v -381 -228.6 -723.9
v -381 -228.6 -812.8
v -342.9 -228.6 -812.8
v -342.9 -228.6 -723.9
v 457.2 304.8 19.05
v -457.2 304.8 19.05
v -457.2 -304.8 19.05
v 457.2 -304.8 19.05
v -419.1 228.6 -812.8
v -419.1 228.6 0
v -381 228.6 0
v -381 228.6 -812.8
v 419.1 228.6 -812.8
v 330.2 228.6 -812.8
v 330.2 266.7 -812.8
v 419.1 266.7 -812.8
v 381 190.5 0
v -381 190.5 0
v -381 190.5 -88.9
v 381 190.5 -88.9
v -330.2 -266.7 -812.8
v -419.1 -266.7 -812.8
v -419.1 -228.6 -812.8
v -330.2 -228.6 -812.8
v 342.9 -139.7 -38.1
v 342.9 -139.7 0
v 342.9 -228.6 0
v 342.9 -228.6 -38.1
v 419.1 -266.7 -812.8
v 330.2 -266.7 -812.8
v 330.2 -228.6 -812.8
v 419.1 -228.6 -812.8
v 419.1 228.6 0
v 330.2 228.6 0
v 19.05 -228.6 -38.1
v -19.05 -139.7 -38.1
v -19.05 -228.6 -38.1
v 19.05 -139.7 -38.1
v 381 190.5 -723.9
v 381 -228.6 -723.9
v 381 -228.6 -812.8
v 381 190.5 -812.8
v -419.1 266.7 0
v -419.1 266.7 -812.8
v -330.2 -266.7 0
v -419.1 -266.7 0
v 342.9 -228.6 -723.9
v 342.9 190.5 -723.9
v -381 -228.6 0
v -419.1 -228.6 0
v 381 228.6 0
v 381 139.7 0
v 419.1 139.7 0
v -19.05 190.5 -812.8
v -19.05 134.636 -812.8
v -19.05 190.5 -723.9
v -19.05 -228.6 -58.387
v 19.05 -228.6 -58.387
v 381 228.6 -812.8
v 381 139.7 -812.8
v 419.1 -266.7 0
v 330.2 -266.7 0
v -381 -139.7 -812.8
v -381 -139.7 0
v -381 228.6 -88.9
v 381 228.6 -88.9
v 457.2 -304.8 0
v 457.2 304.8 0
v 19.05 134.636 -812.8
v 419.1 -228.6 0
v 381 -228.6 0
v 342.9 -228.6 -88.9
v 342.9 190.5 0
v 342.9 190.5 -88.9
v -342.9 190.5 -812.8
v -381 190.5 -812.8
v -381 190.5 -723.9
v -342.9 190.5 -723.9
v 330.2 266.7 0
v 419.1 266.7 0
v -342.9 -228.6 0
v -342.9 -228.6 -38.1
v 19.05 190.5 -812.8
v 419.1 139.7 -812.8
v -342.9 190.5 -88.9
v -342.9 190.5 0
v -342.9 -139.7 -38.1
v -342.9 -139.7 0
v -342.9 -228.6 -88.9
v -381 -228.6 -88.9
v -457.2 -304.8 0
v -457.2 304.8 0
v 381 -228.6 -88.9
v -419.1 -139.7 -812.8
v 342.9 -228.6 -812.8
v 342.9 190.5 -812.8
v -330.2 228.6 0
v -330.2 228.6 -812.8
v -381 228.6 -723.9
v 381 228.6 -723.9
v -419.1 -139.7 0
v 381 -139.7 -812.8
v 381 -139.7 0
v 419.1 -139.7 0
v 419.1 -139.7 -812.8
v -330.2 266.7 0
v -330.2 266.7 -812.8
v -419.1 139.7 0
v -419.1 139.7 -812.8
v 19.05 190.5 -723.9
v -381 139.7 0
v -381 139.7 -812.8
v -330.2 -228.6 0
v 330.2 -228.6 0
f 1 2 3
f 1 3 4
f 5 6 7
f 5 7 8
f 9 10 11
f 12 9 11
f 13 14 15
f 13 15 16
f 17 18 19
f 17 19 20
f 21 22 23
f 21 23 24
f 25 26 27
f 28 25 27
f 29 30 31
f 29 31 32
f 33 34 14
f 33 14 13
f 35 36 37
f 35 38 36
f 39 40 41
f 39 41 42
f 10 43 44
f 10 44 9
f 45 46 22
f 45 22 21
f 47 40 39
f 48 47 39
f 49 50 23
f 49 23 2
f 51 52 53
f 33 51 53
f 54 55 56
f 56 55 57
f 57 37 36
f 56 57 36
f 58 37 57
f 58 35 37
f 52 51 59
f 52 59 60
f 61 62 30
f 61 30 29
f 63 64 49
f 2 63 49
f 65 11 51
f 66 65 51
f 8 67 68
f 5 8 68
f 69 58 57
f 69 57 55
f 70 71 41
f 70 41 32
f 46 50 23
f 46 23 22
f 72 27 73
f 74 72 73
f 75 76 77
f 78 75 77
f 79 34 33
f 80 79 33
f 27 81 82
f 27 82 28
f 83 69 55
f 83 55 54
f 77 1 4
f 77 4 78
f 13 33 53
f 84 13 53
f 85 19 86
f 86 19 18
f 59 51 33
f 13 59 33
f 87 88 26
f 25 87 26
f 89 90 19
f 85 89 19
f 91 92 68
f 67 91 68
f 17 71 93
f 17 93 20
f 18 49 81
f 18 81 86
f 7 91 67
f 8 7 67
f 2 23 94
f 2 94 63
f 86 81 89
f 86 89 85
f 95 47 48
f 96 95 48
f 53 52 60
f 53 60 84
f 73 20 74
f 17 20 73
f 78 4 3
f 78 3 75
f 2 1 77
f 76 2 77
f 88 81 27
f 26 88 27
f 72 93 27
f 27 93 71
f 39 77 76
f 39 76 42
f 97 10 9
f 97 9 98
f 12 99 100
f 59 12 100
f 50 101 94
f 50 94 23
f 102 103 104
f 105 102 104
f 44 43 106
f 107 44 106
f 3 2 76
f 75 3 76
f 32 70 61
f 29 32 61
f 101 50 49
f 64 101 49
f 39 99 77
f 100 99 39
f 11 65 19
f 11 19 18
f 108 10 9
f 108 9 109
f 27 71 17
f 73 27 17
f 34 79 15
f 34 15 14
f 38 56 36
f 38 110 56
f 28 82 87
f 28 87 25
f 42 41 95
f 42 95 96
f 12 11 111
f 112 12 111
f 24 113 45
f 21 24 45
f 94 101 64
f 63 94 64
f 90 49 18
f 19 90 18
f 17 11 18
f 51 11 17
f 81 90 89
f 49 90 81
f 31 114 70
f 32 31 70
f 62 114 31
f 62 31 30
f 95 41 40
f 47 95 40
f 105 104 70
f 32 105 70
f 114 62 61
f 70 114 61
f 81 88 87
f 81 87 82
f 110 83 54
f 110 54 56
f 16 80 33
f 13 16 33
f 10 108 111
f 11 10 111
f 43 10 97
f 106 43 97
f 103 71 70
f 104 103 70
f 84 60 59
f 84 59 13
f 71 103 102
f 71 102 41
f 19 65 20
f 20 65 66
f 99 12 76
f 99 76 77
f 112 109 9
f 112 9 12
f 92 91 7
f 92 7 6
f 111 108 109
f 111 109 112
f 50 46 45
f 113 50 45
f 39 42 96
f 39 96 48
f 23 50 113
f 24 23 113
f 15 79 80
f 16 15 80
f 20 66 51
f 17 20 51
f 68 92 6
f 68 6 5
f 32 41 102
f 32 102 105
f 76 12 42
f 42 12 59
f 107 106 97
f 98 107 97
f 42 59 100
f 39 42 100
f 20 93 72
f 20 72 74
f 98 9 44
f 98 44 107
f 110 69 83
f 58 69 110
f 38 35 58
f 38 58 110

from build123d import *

# Parameters (mm, degrees)
F0_W      = 914.4
F0_H      = 609.6
F1_DEPTH  = 19.05
F2_W      = 88.9
F2_H      = 38.1
F3_DEPTH  = 812.8
F4_W      = 38.1
F4_H      = 88.9
F5_DEPTH  = 812.8
F6_W      = 762
F6_H      = 88.9
F7_DEPTH  = 38.1
F8_W      = 419.1
F8_H      = 88.9
F9_DEPTH  = 38.1
F11_W     = 685.8
F11_H     = 88.9
F12_DEPTH = 38.1
F14_DEPTH = 19.05


with BuildPart() as f1:
    # F0 (on Top) → F1 (new body)
    with BuildSketch(Plane.XY):
        Rectangle(F0_W, F0_H)
    extrude(amount=F1_DEPTH)


with BuildPart() as f3:
    # F2 (on face) → F3 (new body)
    with BuildSketch(Plane(origin=(0, 0, 0), x_dir=(1, 0, 0), z_dir=(0, 0, -1))):
        with Locations((-374.65, 247.65)):
            Rectangle(F2_W, F2_H)
        with Locations((-374.65, -247.65)):
            Rectangle(F2_W, F2_H)
        with Locations((374.65, 247.65)):
            Rectangle(F2_W, F2_H)
        with Locations((374.65, -247.65)):
            Rectangle(F2_W, F2_H)
    extrude(amount=F3_DEPTH)


with BuildPart() as f5:
    # F4 (on face) → F5 (new body, through all)
    with BuildSketch(Plane(origin=(0, 0, 0), x_dir=(1, 0, 0), z_dir=(0, 0, -1))):
        with Locations((-400.05, 184.15)):
            Rectangle(F4_W, F4_H)
        with Locations((-400.05, -184.15)):
            Rectangle(F4_W, F4_H)
        with Locations((400.05, 184.15)):
            Rectangle(F4_W, F4_H)
        with Locations((400.05, -184.15)):
            Rectangle(F4_W, F4_H)
    extrude(amount=F5_DEPTH)


with BuildPart() as f7:
    # F6 (on face) → F7 (new body)
    with BuildSketch(Plane.XZ.offset(-228.6)):
        with Locations((0, -44.45)):
            Rectangle(F6_W, F6_H)
        with Locations((0, -768.35)):
            Rectangle(F6_W, F6_H)
    extrude(amount=F7_DEPTH)


with BuildPart() as f9:
    # F8 (on face) → F9 (new body)
    with BuildSketch(Plane.YZ.offset(-381)):
        with Locations((-19.05, -44.45)):
            Rectangle(F8_W, F8_H)
        with Locations((-19.05, -768.35)):
            Rectangle(F8_W, F8_H)
    extrude(amount=F9_DEPTH)


with BuildPart() as f10_1:
    # F10: instance of F9
    add(f9.part.mirror(Plane.YZ))


with BuildPart() as f12:
    # F11 (on face) → F12 (new body)
    with BuildSketch(Plane(origin=(0, 0, 0), x_dir=(1, 0, 0), z_dir=(0, 0, -1))):
        with Locations((0, 184.15)):
            Rectangle(F11_W, F11_H)
    extrude(amount=F12_DEPTH)


with BuildPart() as f14:
    # F13 (on Right) → F14 (new body, symmetric)
    with BuildSketch(Plane.YZ):
        Polygon((-228.6, -38.1), (-228.6, -58.387309), (134.63574, -812.8), (190.5, -812.8), (190.5, -723.9), (-139.7, -38.1), align=None)
    extrude(amount=F14_DEPTH, both=True)


solid = Compound([f1.part, f3.part, f5.part, f7.part, f9.part, f10_1.part, f12.part, f14.part])
